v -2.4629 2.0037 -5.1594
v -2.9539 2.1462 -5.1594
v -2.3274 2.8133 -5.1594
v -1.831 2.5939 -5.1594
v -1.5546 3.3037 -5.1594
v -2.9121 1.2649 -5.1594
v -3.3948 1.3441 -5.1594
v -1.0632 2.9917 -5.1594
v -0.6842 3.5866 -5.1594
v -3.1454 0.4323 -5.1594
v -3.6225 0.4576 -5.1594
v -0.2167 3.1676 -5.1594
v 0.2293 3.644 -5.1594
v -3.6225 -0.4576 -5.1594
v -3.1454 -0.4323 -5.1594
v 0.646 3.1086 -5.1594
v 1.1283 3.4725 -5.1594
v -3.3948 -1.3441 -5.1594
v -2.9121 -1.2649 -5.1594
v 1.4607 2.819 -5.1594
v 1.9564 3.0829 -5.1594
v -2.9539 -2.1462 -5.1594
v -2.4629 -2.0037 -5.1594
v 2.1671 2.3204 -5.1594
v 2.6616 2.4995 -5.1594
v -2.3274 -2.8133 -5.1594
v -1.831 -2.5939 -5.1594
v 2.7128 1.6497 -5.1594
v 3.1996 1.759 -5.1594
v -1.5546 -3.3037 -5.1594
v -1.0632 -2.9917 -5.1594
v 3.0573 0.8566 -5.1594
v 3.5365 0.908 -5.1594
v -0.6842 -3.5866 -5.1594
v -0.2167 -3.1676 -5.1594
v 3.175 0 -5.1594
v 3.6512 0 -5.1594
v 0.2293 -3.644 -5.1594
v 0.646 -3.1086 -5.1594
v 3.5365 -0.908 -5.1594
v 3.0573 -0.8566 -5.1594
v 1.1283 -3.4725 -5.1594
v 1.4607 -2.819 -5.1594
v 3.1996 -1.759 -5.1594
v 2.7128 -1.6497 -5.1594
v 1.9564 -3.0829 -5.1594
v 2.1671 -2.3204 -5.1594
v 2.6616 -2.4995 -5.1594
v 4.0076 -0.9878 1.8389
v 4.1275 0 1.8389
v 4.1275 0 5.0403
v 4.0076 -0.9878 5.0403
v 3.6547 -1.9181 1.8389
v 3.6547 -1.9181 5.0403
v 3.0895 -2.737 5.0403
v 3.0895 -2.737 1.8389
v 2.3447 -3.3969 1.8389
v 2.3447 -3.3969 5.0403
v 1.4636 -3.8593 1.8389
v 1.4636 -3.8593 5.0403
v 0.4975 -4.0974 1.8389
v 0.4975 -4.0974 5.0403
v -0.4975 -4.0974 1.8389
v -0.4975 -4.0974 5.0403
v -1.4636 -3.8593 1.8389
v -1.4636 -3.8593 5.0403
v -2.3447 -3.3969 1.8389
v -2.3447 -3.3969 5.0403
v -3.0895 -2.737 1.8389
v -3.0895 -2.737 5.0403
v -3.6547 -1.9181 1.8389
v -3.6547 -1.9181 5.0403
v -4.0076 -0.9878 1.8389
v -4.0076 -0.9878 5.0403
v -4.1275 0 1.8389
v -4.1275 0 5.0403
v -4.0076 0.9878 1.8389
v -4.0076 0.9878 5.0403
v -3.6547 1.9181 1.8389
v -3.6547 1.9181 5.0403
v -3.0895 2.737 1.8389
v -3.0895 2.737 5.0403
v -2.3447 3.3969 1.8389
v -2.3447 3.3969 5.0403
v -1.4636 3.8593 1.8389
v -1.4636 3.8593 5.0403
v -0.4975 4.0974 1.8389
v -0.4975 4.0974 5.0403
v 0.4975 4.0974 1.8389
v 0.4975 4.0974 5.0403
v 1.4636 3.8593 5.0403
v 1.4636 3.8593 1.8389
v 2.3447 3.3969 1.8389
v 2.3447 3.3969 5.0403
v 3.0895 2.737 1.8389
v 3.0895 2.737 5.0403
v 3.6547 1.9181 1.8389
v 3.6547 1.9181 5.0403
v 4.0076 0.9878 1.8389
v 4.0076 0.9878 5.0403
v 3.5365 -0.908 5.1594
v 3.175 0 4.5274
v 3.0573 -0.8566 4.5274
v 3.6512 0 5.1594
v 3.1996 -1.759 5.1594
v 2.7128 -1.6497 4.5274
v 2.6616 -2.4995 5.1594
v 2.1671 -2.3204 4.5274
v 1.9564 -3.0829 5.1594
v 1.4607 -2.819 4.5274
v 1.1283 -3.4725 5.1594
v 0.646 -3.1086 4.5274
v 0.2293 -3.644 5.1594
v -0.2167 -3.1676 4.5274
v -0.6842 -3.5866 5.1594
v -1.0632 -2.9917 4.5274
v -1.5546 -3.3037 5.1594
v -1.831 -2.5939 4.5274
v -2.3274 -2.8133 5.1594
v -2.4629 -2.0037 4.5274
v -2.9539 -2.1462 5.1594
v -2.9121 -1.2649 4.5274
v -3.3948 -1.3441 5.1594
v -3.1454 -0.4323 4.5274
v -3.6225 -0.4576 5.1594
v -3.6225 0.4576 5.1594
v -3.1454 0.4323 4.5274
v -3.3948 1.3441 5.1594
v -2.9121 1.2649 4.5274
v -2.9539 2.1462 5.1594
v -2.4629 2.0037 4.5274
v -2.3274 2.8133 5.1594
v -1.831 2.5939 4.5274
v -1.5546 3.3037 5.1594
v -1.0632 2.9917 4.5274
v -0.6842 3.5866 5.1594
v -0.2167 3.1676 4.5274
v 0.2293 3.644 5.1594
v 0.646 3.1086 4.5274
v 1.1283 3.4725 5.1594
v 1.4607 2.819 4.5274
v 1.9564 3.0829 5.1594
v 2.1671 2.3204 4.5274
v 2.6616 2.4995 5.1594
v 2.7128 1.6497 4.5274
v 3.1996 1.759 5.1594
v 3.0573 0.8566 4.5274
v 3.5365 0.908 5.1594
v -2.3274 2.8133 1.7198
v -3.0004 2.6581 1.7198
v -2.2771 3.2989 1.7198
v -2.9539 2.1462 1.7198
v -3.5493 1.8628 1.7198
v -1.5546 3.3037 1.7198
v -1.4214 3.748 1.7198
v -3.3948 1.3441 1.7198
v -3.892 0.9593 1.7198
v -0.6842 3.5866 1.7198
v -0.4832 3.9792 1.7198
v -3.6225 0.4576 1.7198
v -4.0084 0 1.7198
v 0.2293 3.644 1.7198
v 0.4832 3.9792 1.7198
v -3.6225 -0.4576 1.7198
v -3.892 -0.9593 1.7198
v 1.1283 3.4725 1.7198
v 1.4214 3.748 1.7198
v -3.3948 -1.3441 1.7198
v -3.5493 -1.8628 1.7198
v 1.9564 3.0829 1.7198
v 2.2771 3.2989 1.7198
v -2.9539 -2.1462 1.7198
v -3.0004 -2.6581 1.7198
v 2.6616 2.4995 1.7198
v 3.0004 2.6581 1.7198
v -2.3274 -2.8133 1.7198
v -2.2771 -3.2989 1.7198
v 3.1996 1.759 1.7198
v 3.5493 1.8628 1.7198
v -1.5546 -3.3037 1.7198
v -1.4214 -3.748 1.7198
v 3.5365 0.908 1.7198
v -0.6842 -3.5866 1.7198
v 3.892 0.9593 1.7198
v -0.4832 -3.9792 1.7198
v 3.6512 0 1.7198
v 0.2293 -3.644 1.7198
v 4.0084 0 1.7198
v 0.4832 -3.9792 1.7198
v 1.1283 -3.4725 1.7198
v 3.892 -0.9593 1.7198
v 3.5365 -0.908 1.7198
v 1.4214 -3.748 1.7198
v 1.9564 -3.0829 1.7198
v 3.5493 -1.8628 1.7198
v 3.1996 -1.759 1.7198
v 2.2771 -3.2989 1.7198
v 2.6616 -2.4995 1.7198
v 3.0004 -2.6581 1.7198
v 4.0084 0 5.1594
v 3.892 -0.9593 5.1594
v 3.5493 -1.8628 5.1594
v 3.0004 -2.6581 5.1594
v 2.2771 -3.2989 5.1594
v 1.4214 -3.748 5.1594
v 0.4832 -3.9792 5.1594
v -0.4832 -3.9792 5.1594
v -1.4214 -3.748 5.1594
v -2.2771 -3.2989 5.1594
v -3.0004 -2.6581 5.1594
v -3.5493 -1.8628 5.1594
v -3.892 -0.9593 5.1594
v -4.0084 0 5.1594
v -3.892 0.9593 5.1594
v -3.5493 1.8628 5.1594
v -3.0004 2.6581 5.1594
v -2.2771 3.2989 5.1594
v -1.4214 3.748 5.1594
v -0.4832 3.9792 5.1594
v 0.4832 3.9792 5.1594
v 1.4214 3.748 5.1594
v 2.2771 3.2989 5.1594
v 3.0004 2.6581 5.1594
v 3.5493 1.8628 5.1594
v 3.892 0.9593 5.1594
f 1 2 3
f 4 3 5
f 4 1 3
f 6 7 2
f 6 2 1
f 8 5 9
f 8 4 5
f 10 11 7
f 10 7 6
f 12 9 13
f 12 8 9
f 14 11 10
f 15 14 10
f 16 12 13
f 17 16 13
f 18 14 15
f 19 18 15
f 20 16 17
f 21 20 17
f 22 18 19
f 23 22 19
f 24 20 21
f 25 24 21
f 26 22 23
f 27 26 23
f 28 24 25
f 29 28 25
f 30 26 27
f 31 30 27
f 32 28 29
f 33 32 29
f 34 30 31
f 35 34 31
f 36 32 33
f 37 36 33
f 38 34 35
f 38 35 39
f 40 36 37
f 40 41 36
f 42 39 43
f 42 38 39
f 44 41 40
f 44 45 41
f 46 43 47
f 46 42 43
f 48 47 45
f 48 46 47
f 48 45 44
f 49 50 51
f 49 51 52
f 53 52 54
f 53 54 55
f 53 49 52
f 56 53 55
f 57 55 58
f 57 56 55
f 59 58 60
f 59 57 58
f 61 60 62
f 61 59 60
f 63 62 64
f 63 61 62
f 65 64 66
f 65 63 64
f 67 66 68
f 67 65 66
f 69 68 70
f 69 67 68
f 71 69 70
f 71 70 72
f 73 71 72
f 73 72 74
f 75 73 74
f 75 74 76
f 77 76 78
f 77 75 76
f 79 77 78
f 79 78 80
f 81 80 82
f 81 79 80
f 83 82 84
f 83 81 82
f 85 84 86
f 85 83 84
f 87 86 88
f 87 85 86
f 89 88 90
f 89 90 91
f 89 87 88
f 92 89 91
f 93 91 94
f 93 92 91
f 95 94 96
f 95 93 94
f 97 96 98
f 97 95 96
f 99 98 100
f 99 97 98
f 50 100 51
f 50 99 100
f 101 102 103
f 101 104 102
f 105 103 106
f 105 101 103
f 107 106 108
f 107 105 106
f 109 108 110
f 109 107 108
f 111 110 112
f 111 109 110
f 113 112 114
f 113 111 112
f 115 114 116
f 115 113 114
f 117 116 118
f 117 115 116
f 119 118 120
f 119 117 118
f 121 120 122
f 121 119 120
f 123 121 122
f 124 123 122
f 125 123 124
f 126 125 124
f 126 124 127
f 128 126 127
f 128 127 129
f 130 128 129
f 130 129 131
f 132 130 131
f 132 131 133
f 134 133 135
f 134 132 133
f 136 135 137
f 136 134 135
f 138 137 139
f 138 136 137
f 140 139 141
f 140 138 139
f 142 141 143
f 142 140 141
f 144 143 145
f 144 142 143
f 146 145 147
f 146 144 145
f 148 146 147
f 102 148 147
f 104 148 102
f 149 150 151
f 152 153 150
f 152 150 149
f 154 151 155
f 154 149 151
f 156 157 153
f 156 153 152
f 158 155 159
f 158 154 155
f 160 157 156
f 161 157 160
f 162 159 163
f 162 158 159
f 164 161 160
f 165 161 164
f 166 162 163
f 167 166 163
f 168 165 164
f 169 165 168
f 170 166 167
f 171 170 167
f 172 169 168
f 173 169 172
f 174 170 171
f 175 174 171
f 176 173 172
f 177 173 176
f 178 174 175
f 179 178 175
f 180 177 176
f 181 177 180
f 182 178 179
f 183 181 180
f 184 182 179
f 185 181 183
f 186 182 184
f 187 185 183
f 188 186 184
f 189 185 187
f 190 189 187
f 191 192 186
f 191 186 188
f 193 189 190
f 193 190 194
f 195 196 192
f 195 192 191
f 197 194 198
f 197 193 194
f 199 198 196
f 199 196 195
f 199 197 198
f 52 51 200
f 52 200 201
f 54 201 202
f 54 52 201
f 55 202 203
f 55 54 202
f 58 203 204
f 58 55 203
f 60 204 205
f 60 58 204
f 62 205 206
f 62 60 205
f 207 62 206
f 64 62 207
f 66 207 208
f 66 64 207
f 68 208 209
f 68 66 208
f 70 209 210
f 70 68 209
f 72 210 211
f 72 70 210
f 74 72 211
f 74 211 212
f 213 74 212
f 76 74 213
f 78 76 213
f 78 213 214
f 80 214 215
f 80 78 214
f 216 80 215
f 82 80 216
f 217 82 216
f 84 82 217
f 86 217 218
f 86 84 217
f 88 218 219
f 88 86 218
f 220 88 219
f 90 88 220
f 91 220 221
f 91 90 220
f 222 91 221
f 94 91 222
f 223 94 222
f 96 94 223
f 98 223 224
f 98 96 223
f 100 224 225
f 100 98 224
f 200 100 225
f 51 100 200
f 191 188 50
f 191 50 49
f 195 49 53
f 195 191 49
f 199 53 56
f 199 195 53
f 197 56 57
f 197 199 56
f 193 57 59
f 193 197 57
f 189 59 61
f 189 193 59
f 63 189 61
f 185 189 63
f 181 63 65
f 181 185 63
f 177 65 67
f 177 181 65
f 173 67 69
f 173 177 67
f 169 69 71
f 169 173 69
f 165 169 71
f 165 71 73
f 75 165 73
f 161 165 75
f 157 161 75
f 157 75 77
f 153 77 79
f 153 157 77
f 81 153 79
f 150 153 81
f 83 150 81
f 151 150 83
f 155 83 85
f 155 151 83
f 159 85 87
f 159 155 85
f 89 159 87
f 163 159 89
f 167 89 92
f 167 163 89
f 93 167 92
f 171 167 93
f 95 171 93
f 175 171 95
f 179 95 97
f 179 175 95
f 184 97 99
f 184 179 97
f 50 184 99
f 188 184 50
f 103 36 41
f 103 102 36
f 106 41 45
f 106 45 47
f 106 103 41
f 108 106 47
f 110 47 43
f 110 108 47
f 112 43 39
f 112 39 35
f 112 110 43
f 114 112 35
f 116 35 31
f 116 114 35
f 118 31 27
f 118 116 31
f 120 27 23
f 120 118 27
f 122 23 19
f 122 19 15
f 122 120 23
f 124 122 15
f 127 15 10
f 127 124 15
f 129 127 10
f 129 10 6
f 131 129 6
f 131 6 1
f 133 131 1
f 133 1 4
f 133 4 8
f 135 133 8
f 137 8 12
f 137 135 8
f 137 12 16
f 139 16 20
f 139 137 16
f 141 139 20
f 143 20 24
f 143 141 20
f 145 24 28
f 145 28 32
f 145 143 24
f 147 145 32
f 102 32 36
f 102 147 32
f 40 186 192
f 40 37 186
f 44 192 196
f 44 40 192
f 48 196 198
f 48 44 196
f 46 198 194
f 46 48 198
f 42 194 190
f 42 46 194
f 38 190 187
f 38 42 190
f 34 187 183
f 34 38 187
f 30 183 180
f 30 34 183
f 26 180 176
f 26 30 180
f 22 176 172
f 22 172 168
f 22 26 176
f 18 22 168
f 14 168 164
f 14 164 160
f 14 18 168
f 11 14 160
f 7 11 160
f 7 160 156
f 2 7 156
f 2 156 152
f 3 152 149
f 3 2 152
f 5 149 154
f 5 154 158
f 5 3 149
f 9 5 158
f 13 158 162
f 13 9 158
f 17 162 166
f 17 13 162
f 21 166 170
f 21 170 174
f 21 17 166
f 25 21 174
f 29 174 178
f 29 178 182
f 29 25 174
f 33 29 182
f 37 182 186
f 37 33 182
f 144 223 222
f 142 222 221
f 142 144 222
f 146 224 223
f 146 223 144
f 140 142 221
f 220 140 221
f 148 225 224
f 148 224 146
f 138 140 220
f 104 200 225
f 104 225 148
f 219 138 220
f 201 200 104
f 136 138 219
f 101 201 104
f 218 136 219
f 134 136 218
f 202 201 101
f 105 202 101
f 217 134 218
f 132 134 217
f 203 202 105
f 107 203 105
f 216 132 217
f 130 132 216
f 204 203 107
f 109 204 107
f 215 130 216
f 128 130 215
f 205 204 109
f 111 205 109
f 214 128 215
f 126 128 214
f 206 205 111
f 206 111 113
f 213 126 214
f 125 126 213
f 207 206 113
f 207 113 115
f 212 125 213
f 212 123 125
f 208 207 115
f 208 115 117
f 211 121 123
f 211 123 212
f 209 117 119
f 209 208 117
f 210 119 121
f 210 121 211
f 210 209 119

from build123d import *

# Parameters (mm, degrees)
CHAMFER1_SIZE = 0.1190625


with BuildPart() as part:
    # Sketch2 → Revolve1 (revolve)
    with BuildSketch(Plane(origin=(0, 0, 0), x_dir=(0, 0, -1), z_dir=(1, 0, 0)), mode=Mode.PRIVATE) as revolve1_sk:
        Polygon((-4.527369904, 3.175), (-5.159375, 3.65125), (-5.159375, 4.1275), (-1.719791667, 4.1275), (-1.719791667, 3.65125), (5.159375, 3.65125), (5.159375, 3.175), align=None)
    revolve(revolve1_sk.sketch.rotate(Axis((0, 0, 5.159375), (0, 0, -1)), 90), axis=Axis((0, 0, 5.159375), (0, 0, -1)))

    # Chamfer1
    chamfer1_edges = [part.edges().sort_by_distance(p)[0] for p in [
        (-4.1275, 0, 1.719791667),
        (-4.1275, 0, 5.159375),
    ]]
    chamfer(chamfer1_edges, length=CHAMFER1_SIZE)


solid = part.part
